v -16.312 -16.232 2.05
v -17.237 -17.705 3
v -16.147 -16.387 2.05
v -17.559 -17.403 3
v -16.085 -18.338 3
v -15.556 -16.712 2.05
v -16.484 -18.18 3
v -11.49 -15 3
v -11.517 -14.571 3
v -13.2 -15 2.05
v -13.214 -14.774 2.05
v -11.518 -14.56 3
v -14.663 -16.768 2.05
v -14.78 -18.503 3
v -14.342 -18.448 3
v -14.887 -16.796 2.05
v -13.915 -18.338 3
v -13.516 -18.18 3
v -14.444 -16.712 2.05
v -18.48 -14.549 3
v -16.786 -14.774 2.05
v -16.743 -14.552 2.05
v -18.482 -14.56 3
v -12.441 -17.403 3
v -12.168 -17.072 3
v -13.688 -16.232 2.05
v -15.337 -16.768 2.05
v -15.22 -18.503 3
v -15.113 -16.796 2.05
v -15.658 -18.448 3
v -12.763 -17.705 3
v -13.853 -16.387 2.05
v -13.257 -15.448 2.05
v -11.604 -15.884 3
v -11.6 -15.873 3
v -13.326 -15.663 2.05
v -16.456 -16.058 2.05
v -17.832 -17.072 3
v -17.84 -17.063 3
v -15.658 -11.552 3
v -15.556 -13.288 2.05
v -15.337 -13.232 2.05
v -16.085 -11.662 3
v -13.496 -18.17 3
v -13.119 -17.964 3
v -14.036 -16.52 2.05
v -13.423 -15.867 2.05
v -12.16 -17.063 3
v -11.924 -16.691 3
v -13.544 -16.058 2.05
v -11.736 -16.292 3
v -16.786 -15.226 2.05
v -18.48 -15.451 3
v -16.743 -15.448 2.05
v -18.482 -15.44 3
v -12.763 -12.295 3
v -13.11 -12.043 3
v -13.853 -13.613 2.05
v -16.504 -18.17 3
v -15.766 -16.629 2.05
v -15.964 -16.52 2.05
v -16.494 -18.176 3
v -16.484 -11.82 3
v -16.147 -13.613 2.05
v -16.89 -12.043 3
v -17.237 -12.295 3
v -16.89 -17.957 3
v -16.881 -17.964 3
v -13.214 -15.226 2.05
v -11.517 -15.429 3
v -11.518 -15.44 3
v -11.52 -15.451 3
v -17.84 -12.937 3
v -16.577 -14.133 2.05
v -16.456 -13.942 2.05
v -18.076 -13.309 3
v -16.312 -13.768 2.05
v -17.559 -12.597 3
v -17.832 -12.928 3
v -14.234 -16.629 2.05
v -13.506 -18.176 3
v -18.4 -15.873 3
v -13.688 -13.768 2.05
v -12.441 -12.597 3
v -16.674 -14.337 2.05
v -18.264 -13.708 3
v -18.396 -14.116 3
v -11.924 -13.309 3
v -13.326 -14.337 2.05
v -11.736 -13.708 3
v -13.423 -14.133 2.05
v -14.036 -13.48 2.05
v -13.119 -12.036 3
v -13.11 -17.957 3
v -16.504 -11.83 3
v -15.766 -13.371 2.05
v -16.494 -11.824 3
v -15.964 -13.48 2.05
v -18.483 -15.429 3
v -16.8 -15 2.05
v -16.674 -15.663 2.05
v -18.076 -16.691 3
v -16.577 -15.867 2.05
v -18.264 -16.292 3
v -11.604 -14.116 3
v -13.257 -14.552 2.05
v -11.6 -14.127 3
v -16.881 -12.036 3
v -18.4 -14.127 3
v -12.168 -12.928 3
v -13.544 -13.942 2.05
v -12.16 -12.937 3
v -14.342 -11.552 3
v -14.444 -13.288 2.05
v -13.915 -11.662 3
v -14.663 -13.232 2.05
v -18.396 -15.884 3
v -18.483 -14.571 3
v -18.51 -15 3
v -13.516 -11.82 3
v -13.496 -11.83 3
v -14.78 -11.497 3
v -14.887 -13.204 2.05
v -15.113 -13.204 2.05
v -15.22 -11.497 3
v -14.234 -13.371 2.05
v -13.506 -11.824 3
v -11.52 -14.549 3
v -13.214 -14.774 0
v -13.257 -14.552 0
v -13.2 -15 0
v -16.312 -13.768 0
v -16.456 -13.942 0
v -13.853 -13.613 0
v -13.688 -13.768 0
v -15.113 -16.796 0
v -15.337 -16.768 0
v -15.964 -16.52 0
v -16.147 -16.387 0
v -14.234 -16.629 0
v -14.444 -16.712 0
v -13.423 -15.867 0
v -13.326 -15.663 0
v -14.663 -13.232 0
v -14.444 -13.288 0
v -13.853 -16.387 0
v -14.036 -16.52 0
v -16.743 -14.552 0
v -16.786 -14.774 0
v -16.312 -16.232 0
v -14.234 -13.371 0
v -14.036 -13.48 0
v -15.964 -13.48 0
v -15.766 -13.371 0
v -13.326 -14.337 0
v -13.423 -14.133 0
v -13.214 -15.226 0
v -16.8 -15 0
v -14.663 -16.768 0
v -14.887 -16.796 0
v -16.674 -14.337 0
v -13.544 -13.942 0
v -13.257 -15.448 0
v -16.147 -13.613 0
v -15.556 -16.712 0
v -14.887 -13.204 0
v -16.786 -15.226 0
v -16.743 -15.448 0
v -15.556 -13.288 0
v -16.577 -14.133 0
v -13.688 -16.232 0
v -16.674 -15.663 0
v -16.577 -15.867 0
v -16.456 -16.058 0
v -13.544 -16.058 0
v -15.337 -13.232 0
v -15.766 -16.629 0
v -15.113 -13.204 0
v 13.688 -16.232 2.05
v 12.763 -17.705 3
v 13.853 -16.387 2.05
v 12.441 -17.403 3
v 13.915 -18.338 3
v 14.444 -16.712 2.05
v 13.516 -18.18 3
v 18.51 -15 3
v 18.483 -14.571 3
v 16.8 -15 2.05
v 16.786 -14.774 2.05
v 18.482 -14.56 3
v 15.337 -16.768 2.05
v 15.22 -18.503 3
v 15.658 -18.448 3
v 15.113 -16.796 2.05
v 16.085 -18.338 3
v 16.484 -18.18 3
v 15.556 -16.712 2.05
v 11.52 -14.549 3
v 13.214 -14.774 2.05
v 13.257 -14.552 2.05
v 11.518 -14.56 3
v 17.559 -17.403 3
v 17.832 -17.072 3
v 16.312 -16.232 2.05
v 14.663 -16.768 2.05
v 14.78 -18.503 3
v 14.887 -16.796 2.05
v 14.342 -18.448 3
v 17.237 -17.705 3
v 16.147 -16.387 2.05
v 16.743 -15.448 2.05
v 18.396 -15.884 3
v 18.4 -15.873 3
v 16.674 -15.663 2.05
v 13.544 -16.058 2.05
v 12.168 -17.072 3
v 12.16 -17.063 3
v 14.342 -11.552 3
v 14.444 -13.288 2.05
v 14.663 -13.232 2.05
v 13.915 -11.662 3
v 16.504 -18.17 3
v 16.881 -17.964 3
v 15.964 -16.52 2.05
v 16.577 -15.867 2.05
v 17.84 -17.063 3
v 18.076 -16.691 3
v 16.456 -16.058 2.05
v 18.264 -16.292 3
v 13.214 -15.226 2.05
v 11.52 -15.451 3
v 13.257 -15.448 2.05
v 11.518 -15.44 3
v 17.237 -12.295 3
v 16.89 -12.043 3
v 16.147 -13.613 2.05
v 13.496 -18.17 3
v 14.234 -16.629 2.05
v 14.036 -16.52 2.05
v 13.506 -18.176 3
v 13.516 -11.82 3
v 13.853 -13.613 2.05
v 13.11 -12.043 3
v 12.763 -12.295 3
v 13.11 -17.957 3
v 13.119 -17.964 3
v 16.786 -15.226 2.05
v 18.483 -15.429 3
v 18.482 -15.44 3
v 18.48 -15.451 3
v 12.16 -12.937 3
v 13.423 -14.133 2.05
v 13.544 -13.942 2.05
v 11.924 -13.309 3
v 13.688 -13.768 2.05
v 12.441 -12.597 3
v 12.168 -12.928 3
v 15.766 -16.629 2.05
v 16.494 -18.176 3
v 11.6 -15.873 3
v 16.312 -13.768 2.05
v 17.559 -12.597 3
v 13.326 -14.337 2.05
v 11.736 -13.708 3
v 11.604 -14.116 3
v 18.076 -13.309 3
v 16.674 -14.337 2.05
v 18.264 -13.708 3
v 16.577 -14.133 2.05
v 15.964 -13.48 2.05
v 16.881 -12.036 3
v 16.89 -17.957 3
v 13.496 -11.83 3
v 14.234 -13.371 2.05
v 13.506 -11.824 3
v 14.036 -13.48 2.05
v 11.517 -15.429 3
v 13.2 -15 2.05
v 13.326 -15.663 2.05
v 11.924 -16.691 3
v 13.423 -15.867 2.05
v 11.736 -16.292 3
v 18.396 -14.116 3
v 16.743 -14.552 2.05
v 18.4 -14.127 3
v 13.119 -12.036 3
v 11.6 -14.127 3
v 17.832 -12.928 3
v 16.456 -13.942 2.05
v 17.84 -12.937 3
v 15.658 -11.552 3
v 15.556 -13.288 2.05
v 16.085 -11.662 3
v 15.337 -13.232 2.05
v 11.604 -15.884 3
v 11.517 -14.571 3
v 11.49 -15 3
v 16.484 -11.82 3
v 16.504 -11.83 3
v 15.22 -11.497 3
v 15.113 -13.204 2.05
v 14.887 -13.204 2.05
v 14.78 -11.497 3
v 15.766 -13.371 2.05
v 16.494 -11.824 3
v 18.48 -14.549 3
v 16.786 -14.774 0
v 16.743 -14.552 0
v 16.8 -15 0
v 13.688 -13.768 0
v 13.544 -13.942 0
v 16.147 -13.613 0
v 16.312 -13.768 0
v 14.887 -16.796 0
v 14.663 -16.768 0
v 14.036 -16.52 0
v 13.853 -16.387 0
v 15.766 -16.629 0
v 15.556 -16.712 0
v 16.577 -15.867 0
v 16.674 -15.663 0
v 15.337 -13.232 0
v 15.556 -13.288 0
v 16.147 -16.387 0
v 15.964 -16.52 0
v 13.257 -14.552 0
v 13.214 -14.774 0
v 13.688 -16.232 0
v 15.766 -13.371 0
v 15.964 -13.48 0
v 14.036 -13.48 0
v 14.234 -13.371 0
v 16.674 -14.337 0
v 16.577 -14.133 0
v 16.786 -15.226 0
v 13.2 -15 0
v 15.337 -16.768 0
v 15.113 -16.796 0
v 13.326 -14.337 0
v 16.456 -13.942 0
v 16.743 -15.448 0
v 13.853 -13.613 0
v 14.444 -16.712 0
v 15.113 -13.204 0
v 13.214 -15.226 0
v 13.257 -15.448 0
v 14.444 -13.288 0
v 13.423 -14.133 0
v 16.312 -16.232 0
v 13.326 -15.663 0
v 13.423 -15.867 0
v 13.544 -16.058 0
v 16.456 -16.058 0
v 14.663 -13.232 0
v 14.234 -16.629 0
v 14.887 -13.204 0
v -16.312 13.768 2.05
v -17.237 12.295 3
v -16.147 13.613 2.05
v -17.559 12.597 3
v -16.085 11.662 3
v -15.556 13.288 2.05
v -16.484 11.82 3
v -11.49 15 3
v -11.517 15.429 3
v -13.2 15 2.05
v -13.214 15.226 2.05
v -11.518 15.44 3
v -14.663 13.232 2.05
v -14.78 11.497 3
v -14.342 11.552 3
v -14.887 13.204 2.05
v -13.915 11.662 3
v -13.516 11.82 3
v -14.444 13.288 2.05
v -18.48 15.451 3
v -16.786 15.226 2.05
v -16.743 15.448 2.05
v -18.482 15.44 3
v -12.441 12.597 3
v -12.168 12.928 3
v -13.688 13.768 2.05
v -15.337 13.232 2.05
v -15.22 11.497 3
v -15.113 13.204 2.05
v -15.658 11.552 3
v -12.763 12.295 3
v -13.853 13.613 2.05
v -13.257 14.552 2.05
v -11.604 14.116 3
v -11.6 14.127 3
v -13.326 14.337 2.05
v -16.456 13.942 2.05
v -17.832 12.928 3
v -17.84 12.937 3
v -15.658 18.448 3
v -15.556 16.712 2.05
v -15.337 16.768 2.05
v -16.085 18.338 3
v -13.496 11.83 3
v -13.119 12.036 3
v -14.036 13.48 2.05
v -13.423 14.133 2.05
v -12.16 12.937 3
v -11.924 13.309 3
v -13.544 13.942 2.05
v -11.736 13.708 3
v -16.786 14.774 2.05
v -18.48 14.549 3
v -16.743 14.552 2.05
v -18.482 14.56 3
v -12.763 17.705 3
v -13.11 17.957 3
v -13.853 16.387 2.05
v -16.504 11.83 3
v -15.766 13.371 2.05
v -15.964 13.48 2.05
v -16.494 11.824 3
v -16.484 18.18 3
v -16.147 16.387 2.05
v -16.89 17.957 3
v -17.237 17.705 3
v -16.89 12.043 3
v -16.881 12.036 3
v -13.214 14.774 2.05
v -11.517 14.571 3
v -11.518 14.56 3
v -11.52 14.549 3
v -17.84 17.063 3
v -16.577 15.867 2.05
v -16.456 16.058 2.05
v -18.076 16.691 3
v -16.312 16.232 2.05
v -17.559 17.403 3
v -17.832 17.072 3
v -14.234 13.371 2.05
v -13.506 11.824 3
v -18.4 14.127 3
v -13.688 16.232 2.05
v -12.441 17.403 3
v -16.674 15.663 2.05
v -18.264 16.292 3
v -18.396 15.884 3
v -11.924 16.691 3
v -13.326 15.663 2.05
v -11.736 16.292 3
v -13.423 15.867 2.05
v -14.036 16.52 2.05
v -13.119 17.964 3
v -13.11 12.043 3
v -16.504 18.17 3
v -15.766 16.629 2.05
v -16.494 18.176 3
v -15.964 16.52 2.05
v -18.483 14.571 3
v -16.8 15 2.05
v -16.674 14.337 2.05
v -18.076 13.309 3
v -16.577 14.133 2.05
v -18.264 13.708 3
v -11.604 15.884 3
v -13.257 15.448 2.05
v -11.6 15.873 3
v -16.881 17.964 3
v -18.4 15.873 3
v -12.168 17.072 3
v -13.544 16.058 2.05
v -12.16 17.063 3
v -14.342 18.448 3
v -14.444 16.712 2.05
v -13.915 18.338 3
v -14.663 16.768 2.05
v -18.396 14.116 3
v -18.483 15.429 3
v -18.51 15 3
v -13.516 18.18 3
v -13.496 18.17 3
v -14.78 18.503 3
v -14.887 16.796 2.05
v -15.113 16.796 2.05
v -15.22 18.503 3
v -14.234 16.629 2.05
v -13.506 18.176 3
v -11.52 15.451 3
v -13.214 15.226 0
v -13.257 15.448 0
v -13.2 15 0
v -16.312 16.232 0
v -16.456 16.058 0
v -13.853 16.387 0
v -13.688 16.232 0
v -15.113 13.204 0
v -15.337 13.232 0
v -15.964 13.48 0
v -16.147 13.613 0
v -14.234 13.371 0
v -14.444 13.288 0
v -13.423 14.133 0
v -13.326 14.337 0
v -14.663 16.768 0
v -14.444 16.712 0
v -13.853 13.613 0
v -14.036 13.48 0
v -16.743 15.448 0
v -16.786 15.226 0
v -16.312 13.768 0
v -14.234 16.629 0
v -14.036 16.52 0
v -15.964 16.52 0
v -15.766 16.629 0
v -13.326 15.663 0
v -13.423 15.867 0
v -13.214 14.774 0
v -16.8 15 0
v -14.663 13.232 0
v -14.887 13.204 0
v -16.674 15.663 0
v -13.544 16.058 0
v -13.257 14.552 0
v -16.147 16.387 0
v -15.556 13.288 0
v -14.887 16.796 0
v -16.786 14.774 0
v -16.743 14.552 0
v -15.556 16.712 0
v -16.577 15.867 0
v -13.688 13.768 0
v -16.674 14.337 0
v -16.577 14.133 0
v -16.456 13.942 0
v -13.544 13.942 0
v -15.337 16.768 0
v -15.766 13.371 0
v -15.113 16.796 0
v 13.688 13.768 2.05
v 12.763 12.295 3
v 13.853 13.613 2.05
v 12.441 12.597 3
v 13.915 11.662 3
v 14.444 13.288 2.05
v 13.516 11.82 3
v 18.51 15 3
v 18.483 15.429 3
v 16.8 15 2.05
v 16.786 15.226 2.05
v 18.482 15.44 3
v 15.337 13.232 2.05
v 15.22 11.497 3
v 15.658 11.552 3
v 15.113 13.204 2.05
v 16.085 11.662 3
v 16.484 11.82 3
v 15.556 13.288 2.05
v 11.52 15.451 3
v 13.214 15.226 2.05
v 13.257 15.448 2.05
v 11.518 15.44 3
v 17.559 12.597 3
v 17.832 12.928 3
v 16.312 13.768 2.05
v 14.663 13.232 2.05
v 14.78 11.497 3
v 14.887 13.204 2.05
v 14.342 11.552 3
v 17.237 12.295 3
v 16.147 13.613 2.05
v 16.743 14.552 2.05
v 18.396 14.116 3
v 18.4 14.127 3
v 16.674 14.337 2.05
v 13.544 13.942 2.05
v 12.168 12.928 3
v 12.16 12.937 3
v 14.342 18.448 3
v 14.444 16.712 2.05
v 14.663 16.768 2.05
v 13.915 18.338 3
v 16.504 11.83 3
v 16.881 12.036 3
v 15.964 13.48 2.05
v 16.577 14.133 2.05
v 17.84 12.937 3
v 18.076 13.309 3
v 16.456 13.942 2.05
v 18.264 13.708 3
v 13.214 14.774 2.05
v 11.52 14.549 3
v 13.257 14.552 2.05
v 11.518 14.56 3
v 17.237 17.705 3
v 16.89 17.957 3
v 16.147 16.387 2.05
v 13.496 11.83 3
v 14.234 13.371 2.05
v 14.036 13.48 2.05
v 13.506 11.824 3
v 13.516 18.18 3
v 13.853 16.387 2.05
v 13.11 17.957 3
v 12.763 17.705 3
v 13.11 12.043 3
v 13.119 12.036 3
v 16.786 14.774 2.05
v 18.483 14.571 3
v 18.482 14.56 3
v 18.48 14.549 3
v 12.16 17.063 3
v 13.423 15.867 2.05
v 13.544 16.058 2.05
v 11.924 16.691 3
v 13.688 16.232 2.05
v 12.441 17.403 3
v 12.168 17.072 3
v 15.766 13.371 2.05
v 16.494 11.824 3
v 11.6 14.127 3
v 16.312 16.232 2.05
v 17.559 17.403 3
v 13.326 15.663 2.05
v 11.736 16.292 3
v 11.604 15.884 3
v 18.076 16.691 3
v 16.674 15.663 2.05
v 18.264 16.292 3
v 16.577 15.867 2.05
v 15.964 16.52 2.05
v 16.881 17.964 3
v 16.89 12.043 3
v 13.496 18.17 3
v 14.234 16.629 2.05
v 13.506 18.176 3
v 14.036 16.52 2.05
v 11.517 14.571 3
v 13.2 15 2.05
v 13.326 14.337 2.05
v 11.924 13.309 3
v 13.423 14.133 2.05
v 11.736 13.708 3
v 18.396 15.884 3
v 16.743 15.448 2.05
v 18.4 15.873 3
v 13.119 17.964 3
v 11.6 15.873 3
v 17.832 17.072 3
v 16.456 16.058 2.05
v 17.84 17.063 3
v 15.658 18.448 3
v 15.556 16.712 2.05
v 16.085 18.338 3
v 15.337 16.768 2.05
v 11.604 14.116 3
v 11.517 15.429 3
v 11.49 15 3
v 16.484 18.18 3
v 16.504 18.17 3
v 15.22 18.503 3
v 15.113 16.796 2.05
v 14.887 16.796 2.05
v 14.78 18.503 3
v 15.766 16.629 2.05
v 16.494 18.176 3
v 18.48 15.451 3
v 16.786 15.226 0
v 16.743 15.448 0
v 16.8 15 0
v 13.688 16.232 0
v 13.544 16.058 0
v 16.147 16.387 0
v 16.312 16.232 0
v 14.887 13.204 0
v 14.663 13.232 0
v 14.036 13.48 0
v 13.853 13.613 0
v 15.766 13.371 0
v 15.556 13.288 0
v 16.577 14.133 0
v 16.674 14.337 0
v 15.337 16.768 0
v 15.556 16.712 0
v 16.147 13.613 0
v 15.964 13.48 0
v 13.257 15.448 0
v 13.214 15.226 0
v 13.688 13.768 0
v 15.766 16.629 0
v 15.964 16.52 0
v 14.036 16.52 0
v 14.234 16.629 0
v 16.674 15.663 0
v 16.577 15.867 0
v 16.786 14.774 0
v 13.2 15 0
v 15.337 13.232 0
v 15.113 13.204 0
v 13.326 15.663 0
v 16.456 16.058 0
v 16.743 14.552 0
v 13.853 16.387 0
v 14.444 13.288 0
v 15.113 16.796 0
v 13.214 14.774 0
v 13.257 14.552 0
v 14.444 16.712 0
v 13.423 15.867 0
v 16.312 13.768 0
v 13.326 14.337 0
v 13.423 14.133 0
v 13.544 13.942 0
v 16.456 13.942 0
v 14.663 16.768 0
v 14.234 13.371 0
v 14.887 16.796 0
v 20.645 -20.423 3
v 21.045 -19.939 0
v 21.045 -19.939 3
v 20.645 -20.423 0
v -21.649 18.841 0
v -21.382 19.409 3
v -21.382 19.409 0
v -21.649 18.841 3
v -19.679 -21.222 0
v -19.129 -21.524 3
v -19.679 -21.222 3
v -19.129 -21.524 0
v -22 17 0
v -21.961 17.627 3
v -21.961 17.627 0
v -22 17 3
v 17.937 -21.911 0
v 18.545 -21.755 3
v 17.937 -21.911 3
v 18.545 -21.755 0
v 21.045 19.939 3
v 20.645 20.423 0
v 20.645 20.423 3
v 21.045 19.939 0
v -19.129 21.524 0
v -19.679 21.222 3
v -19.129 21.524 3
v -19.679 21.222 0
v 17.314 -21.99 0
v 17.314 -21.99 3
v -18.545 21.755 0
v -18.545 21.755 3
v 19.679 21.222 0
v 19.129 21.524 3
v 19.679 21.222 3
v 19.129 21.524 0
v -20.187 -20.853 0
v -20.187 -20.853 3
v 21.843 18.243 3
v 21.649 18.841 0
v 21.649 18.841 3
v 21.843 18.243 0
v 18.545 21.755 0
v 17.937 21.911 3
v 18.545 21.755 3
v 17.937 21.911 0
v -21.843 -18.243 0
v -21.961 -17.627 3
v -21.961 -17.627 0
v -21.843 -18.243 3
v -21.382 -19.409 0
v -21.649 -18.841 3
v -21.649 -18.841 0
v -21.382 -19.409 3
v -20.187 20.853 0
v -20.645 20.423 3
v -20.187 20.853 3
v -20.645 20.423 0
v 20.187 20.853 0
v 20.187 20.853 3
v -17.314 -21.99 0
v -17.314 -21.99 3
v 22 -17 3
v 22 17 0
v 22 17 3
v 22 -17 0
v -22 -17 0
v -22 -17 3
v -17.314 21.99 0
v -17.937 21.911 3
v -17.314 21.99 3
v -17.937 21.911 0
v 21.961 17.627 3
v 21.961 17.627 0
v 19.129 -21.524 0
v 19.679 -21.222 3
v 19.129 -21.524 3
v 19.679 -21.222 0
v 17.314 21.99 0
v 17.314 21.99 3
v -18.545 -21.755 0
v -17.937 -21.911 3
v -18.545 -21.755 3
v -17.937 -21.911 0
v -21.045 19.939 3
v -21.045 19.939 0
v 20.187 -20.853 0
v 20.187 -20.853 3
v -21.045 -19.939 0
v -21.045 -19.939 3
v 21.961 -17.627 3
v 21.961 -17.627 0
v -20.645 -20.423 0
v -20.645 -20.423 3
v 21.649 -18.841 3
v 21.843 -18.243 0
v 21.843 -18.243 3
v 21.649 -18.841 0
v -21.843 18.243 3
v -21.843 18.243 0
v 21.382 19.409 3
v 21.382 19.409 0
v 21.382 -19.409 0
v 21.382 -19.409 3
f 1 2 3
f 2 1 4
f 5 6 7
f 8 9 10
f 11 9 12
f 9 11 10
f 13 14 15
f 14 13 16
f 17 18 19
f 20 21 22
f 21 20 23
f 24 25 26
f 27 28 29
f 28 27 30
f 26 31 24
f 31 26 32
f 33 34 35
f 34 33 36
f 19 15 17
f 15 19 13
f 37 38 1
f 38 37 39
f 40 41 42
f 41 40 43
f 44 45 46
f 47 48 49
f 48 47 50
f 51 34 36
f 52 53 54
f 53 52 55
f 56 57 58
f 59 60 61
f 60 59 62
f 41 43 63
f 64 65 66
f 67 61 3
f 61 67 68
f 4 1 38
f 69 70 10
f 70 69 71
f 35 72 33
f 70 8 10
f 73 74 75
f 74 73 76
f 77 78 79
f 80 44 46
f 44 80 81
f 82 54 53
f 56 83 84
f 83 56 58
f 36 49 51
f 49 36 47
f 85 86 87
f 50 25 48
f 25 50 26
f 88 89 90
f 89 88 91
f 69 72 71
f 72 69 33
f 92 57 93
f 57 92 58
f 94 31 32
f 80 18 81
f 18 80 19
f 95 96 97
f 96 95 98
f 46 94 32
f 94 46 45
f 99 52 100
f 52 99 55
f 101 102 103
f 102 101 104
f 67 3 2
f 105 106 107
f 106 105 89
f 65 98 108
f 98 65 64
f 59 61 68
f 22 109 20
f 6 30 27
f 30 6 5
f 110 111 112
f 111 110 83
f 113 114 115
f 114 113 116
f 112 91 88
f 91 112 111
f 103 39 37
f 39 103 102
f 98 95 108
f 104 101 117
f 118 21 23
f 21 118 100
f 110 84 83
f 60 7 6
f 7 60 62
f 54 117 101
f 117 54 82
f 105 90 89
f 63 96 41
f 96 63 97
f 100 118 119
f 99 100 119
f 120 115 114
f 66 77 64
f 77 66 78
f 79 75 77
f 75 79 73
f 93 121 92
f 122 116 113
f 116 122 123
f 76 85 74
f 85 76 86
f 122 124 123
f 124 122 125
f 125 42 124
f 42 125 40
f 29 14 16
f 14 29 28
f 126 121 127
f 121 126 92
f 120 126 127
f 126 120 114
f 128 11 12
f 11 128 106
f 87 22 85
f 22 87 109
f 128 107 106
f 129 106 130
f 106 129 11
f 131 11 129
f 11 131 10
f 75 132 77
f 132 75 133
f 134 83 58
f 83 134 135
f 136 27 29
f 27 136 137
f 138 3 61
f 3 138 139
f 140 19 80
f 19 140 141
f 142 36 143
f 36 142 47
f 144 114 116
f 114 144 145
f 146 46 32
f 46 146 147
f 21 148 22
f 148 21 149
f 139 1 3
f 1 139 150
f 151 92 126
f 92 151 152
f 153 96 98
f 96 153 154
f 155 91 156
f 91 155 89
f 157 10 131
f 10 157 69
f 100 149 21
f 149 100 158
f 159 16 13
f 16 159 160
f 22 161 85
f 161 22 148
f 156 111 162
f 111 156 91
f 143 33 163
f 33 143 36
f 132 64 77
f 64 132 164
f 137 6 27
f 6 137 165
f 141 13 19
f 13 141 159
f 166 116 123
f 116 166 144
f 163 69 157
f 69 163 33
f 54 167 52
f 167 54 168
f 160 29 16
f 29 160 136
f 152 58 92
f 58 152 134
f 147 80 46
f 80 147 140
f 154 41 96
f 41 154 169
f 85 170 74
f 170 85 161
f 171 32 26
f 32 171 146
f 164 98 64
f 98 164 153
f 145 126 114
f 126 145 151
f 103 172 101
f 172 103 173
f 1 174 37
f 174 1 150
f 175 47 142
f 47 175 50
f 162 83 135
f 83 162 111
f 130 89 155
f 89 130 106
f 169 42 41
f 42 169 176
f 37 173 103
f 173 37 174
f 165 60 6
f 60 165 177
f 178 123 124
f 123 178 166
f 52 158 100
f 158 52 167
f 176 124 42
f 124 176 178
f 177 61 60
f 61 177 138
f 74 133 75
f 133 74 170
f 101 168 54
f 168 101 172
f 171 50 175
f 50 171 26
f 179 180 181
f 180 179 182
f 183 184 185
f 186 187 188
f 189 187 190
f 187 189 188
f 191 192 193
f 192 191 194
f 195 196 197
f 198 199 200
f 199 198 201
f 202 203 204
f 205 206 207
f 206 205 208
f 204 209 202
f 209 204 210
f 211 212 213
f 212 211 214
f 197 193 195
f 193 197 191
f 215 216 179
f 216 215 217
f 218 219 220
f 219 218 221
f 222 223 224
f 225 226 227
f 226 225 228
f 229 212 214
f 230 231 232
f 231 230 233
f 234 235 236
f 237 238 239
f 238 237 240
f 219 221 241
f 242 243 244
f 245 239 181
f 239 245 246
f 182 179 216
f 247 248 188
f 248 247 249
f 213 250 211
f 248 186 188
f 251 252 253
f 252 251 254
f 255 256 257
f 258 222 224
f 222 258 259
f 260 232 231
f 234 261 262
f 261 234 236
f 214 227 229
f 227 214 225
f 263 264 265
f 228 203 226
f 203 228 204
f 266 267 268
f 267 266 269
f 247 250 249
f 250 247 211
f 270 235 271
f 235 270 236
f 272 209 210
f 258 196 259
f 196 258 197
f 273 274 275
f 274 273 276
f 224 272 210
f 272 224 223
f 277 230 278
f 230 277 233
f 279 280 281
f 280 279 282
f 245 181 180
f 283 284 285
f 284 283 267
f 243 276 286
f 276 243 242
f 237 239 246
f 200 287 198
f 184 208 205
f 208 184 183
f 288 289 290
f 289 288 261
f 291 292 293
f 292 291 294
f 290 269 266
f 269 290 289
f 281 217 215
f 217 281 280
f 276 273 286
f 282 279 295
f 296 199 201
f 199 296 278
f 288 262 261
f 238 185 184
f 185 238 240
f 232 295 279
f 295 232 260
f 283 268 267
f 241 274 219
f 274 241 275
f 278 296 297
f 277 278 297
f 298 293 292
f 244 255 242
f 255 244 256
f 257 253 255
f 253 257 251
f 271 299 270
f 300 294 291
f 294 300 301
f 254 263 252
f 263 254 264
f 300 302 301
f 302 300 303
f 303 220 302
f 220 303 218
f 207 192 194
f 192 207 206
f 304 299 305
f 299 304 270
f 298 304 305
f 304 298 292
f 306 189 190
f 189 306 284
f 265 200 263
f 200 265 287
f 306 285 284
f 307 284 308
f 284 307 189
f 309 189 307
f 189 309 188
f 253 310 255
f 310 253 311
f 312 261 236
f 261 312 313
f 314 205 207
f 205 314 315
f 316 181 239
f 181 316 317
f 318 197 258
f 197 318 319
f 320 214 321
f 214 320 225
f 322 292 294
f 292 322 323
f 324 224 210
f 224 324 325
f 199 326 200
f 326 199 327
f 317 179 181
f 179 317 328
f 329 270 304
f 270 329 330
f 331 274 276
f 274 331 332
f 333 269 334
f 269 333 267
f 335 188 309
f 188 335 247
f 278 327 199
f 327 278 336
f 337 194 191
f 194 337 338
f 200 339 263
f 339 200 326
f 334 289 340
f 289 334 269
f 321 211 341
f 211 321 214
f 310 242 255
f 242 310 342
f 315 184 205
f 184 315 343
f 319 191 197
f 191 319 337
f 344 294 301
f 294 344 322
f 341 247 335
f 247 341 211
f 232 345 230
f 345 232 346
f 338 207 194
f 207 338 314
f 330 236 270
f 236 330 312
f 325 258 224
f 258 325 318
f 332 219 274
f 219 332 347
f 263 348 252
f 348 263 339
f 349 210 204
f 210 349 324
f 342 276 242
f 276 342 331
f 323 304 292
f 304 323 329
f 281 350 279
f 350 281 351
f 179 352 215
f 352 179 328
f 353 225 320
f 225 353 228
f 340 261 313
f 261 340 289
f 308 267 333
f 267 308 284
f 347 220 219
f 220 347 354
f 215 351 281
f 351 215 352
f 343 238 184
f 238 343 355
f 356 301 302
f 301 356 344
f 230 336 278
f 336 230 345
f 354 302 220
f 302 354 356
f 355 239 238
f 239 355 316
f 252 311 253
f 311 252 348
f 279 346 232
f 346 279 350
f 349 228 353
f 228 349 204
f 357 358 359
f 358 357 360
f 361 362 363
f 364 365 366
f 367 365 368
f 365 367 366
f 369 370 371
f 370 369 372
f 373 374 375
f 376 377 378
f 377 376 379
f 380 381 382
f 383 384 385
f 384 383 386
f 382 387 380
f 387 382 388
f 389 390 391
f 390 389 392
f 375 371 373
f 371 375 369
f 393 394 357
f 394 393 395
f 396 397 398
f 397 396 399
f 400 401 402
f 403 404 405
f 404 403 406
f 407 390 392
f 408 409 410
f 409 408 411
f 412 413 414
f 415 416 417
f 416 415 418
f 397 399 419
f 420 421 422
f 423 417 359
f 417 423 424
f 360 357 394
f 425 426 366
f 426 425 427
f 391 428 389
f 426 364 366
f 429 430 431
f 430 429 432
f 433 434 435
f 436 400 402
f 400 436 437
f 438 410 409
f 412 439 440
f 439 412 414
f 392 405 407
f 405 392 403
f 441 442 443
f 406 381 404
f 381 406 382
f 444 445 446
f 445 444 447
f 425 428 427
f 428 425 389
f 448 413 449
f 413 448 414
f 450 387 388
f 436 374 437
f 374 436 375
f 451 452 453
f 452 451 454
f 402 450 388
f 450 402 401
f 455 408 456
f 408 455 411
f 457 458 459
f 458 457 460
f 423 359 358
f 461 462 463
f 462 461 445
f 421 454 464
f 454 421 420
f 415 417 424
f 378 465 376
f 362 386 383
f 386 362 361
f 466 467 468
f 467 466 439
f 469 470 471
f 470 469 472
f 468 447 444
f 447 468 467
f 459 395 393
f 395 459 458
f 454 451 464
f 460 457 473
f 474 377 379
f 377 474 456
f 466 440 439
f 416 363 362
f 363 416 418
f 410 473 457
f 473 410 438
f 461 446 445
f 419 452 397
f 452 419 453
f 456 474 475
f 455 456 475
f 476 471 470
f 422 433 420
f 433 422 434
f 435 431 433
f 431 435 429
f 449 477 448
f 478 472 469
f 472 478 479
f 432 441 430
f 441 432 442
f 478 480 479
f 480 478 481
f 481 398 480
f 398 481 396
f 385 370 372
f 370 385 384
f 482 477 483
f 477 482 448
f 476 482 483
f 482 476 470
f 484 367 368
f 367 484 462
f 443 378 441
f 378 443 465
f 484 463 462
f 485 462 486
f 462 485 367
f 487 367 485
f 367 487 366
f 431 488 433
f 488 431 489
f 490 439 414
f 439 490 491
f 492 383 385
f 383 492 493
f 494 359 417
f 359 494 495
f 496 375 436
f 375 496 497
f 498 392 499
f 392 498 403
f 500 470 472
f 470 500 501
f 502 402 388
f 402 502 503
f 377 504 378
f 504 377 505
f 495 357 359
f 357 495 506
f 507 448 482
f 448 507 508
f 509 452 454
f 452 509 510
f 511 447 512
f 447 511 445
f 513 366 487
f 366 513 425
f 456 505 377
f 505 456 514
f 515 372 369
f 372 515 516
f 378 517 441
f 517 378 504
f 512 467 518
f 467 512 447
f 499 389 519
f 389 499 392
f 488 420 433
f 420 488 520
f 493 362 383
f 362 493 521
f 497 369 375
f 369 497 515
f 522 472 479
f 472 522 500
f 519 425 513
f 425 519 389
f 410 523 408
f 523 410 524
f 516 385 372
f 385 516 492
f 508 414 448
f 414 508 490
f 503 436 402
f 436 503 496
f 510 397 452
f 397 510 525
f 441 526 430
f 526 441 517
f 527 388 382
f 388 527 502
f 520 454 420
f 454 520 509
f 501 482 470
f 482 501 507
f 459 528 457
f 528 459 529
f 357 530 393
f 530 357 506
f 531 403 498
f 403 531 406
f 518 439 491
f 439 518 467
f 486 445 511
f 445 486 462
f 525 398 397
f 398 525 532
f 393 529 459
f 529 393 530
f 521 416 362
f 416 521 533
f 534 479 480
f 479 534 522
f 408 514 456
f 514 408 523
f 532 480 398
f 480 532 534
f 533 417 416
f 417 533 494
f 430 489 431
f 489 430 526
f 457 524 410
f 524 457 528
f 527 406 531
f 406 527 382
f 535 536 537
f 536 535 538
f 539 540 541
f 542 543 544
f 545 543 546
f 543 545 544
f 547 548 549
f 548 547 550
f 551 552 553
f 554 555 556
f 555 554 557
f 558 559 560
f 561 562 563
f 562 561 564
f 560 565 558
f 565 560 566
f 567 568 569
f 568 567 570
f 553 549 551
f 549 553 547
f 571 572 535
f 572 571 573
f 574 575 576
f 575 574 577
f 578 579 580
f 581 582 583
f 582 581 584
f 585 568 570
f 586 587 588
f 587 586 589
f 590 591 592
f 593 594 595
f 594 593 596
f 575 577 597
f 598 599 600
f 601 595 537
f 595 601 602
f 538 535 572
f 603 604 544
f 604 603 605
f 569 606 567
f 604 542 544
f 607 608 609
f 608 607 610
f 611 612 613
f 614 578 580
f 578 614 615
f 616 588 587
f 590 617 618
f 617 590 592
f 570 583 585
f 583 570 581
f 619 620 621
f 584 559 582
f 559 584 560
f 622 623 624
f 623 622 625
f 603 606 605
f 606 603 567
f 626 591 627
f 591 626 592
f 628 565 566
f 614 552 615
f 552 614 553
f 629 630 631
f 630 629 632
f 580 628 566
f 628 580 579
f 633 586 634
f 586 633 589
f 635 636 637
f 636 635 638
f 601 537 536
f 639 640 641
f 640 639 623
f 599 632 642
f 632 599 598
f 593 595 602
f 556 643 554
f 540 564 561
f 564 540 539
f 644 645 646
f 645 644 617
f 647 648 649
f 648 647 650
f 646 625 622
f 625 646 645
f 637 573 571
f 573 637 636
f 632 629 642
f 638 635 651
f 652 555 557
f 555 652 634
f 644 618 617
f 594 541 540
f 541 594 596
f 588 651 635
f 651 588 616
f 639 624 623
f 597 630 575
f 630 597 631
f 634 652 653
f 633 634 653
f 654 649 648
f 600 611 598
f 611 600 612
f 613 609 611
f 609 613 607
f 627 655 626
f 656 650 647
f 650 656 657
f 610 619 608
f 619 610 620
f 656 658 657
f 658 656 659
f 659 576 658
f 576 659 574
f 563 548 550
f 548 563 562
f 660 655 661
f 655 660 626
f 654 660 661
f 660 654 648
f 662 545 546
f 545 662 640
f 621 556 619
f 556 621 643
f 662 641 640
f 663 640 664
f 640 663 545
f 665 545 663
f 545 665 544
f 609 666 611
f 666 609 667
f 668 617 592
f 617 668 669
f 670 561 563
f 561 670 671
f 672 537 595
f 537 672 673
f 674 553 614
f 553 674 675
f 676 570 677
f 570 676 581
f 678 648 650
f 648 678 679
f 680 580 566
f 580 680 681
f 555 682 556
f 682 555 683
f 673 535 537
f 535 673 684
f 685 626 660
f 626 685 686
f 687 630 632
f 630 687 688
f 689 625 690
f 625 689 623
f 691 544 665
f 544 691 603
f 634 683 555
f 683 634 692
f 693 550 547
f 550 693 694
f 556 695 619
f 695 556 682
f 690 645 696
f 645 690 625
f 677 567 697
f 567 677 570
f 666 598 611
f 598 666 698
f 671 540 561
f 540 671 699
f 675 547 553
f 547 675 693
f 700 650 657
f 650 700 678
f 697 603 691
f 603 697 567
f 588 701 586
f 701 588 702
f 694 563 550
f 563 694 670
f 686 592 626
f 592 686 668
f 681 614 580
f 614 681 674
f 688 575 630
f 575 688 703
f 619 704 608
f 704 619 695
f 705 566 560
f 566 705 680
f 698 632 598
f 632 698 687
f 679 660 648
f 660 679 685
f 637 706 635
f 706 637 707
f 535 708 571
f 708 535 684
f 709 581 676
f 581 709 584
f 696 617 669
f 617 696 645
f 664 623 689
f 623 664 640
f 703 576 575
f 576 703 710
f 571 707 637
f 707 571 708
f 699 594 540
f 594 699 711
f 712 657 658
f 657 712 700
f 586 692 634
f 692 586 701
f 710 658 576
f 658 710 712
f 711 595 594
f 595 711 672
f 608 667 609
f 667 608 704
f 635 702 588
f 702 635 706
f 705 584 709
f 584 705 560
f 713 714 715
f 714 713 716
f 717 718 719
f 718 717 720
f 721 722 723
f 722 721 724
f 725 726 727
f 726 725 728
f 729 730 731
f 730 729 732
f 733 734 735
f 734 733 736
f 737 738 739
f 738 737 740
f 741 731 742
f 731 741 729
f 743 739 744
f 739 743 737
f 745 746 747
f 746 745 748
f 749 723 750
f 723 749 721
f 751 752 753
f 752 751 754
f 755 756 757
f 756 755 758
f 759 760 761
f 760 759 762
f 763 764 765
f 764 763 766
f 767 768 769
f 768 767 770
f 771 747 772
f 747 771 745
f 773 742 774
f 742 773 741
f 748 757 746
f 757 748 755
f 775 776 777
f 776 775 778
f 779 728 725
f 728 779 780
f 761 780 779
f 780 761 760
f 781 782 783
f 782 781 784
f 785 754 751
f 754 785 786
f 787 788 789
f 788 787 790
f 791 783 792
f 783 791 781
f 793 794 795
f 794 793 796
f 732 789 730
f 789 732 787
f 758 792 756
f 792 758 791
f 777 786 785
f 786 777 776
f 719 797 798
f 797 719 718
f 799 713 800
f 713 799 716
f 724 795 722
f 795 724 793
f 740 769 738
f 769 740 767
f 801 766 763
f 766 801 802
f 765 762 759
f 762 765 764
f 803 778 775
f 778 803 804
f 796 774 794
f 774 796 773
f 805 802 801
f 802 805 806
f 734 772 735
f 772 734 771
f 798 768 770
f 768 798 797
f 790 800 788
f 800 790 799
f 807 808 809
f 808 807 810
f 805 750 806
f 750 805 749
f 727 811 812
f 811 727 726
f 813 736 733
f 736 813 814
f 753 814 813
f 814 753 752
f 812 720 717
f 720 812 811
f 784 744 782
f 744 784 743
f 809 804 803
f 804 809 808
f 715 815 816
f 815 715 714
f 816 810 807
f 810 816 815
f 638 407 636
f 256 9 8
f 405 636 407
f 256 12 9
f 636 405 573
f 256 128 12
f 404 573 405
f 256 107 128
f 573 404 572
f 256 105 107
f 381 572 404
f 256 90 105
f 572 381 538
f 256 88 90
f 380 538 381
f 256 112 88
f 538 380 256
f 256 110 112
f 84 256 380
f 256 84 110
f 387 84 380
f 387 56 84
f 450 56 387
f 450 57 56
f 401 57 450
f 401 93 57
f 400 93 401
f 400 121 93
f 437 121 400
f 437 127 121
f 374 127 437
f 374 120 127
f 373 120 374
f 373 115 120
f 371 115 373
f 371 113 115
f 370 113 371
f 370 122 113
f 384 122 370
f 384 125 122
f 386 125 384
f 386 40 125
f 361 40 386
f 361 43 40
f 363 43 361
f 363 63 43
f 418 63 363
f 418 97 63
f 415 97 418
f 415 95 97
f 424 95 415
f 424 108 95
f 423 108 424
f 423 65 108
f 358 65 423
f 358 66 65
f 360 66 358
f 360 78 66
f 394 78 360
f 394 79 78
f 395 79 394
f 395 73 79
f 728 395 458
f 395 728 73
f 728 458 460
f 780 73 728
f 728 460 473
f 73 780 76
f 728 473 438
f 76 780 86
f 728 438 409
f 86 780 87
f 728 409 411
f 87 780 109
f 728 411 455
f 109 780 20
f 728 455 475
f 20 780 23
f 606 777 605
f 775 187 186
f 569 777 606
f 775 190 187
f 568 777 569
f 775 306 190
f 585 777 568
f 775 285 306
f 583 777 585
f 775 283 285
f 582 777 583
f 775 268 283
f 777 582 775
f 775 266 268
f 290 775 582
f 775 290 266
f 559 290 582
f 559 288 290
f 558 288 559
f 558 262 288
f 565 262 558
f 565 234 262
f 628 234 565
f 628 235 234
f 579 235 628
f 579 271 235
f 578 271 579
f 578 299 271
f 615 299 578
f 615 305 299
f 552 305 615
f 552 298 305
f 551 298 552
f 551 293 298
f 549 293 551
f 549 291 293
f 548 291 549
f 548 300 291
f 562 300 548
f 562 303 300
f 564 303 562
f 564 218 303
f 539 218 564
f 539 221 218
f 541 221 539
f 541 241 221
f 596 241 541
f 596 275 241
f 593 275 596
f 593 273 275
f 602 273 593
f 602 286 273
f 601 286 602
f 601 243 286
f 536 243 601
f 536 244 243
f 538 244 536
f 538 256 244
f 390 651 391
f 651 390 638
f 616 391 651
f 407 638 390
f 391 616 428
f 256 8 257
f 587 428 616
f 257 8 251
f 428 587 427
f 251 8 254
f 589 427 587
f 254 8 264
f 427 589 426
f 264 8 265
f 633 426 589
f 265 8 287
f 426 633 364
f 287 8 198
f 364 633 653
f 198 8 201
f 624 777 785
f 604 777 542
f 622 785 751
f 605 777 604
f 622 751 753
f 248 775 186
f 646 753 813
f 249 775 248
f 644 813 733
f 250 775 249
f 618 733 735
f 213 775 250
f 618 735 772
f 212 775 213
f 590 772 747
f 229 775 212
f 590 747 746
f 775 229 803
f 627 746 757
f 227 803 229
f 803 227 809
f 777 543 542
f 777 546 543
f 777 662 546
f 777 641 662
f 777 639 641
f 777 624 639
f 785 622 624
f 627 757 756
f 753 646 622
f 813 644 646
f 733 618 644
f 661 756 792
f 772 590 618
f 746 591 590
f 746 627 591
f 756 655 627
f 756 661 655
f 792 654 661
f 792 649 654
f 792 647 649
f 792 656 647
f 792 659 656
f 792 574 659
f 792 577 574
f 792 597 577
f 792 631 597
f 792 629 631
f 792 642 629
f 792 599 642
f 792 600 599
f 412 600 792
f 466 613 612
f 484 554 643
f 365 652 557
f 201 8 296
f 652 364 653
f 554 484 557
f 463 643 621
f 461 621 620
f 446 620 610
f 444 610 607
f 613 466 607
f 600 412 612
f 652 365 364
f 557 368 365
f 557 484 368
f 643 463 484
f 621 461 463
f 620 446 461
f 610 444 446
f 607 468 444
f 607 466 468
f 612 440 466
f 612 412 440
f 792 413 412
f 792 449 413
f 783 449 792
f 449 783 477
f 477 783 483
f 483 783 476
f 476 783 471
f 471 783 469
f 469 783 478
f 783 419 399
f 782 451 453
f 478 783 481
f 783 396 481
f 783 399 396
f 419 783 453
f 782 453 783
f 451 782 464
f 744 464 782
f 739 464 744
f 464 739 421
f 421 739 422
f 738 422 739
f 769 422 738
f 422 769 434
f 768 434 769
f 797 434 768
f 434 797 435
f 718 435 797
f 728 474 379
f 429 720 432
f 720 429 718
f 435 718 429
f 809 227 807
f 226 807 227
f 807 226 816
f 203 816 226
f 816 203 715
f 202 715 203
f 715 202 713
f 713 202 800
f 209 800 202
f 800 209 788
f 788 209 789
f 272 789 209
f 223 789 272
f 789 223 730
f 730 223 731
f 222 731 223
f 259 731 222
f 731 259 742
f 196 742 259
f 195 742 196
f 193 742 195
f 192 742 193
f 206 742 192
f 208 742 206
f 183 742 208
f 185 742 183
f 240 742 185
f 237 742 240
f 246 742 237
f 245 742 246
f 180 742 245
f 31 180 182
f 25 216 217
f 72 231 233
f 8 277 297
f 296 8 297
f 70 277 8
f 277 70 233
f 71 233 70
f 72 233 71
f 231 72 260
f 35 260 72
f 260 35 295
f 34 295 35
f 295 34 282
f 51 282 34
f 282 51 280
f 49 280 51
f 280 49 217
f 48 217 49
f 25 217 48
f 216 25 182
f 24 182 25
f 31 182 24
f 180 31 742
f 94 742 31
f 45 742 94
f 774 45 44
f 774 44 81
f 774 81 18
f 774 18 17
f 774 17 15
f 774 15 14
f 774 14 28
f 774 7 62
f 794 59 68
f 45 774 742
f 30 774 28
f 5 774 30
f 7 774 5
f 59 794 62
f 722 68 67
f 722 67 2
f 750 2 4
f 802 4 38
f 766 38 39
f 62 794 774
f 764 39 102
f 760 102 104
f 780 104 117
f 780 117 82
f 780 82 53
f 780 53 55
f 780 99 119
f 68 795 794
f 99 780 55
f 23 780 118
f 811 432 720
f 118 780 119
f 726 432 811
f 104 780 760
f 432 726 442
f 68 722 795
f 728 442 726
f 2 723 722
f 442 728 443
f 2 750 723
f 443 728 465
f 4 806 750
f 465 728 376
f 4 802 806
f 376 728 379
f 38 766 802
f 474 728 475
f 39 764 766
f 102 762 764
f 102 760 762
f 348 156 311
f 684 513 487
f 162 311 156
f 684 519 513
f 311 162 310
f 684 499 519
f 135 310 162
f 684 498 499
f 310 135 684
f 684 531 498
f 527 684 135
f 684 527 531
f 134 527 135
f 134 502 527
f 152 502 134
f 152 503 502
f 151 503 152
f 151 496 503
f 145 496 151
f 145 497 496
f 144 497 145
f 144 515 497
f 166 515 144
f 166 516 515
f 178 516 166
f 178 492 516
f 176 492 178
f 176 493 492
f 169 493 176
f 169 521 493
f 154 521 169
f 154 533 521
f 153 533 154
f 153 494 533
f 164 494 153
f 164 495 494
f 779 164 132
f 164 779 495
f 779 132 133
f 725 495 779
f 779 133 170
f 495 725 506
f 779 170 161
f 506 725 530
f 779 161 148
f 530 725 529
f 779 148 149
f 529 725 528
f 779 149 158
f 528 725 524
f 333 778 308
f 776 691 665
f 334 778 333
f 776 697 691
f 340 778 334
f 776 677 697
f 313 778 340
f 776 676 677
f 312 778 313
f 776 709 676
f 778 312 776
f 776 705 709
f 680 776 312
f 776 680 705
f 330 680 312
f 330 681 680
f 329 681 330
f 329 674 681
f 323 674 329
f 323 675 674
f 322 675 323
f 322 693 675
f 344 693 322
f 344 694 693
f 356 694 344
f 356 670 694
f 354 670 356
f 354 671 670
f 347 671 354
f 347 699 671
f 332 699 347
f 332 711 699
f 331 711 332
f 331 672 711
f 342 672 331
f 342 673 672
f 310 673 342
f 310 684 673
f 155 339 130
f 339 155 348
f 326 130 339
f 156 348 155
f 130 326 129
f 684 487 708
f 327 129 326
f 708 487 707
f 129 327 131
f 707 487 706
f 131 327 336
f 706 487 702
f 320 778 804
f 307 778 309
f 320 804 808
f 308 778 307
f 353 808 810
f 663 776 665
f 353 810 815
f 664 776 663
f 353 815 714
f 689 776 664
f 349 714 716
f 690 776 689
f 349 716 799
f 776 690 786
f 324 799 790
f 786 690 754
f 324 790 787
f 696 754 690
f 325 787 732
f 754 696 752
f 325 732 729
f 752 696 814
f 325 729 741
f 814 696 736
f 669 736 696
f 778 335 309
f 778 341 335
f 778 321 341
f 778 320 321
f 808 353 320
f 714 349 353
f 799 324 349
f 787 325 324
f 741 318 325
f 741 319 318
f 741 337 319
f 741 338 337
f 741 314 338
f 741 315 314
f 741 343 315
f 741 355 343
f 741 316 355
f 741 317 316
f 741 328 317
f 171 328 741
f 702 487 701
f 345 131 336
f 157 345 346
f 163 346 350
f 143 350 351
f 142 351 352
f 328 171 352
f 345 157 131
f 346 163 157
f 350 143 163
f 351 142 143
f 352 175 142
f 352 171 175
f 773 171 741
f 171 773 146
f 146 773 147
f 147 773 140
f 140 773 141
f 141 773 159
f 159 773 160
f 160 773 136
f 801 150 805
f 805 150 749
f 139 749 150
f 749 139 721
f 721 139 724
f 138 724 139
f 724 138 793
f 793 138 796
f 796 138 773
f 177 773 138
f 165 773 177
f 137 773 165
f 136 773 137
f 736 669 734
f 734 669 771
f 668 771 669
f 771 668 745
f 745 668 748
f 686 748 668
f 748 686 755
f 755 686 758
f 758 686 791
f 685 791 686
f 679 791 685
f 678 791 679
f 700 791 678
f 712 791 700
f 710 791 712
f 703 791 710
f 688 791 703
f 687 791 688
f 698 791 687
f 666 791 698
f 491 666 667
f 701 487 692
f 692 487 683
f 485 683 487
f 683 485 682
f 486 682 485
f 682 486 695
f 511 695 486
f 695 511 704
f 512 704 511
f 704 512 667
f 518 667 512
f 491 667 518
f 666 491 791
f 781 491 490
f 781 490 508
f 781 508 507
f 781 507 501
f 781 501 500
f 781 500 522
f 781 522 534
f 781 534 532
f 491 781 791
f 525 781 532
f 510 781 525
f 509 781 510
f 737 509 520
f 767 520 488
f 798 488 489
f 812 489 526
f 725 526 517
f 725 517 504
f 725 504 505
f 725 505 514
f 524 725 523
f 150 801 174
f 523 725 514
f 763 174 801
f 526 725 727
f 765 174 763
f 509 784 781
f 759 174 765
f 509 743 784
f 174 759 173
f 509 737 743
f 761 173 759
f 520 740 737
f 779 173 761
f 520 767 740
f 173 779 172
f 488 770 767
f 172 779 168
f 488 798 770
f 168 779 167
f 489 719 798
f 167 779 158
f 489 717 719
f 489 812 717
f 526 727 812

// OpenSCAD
$fn = 50;


difference() {
	union() {
		hull() {
			translate(v = [-17.0000000000, 17.0000000000, 0]) {
				cylinder(h = 3, r = 5);
			}
			translate(v = [17.0000000000, 17.0000000000, 0]) {
				cylinder(h = 3, r = 5);
			}
			translate(v = [-17.0000000000, -17.0000000000, 0]) {
				cylinder(h = 3, r = 5);
			}
			translate(v = [17.0000000000, -17.0000000000, 0]) {
				cylinder(h = 3, r = 5);
			}
		}
	}
	union() {
		translate(v = [-15.0000000000, -15.0000000000, 3]) {
			rotate(a = [0, 0, 0]) {
				difference() {
					union() {
						translate(v = [0, 0, -6.0000000000]) {
							cylinder(h = 6, r = 1.5000000000);
						}
						translate(v = [0, 0, -0.9500000000]) {
							cylinder(r1 = 1.8000000000, r2 = 3.6000000000);
						}
						translate(v = [0, 0, -6.0000000000]) {
							cylinder(h = 6, r = 1.8000000000);
						}
						translate(v = [0, 0, -6.0000000000]) {
							cylinder(h = 6, r = 1.5000000000);
						}
					}
					union();
				}
			}
		}
		translate(v = [15.0000000000, -15.0000000000, 3]) {
			rotate(a = [0, 0, 0]) {
				difference() {
					union() {
						translate(v = [0, 0, -6.0000000000]) {
							cylinder(h = 6, r = 1.5000000000);
						}
						translate(v = [0, 0, -0.9500000000]) {
							cylinder(r1 = 1.8000000000, r2 = 3.6000000000);
						}
						translate(v = [0, 0, -6.0000000000]) {
							cylinder(h = 6, r = 1.8000000000);
						}
						translate(v = [0, 0, -6.0000000000]) {
							cylinder(h = 6, r = 1.5000000000);
						}
					}
					union();
				}
			}
		}
		translate(v = [-15.0000000000, 15.0000000000, 3]) {
			rotate(a = [0, 0, 0]) {
				difference() {
					union() {
						translate(v = [0, 0, -6.0000000000]) {
							cylinder(h = 6, r = 1.5000000000);
						}
						translate(v = [0, 0, -0.9500000000]) {
							cylinder(r1 = 1.8000000000, r2 = 3.6000000000);
						}
						translate(v = [0, 0, -6.0000000000]) {
							cylinder(h = 6, r = 1.8000000000);
						}
						translate(v = [0, 0, -6.0000000000]) {
							cylinder(h = 6, r = 1.5000000000);
						}
					}
					union();
				}
			}
		}
		translate(v = [15.0000000000, 15.0000000000, 3]) {
			rotate(a = [0, 0, 0]) {
				difference() {
					union() {
						translate(v = [0, 0, -6.0000000000]) {
							cylinder(h = 6, r = 1.5000000000);
						}
						translate(v = [0, 0, -0.9500000000]) {
							cylinder(r1 = 1.8000000000, r2 = 3.6000000000);
						}
						translate(v = [0, 0, -6.0000000000]) {
							cylinder(h = 6, r = 1.8000000000);
						}
						translate(v = [0, 0, -6.0000000000]) {
							cylinder(h = 6, r = 1.5000000000);
						}
					}
					union();
				}
			}
		}
		translate(v = [0, 0, 3]) {
			hull() {
				union() {
					translate(v = [-17.0000000000, 17.0000000000, 4]) {
						cylinder(h = 27, r = 4);
					}
					translate(v = [-17.0000000000, 17.0000000000, 4]) {
						sphere(r = 4);
					}
					translate(v = [-17.0000000000, 17.0000000000, 31]) {
						sphere(r = 4);
					}
				}
				union() {
					translate(v = [17.0000000000, 17.0000000000, 4]) {
						cylinder(h = 27, r = 4);
					}
					translate(v = [17.0000000000, 17.0000000000, 4]) {
						sphere(r = 4);
					}
					translate(v = [17.0000000000, 17.0000000000, 31]) {
						sphere(r = 4);
					}
				}
				union() {
					translate(v = [-17.0000000000, -17.0000000000, 4]) {
						cylinder(h = 27, r = 4);
					}
					translate(v = [-17.0000000000, -17.0000000000, 4]) {
						sphere(r = 4);
					}
					translate(v = [-17.0000000000, -17.0000000000, 31]) {
						sphere(r = 4);
					}
				}
				union() {
					translate(v = [17.0000000000, -17.0000000000, 4]) {
						cylinder(h = 27, r = 4);
					}
					translate(v = [17.0000000000, -17.0000000000, 4]) {
						sphere(r = 4);
					}
					translate(v = [17.0000000000, -17.0000000000, 31]) {
						sphere(r = 4);
					}
				}
			}
		}
	}
}
